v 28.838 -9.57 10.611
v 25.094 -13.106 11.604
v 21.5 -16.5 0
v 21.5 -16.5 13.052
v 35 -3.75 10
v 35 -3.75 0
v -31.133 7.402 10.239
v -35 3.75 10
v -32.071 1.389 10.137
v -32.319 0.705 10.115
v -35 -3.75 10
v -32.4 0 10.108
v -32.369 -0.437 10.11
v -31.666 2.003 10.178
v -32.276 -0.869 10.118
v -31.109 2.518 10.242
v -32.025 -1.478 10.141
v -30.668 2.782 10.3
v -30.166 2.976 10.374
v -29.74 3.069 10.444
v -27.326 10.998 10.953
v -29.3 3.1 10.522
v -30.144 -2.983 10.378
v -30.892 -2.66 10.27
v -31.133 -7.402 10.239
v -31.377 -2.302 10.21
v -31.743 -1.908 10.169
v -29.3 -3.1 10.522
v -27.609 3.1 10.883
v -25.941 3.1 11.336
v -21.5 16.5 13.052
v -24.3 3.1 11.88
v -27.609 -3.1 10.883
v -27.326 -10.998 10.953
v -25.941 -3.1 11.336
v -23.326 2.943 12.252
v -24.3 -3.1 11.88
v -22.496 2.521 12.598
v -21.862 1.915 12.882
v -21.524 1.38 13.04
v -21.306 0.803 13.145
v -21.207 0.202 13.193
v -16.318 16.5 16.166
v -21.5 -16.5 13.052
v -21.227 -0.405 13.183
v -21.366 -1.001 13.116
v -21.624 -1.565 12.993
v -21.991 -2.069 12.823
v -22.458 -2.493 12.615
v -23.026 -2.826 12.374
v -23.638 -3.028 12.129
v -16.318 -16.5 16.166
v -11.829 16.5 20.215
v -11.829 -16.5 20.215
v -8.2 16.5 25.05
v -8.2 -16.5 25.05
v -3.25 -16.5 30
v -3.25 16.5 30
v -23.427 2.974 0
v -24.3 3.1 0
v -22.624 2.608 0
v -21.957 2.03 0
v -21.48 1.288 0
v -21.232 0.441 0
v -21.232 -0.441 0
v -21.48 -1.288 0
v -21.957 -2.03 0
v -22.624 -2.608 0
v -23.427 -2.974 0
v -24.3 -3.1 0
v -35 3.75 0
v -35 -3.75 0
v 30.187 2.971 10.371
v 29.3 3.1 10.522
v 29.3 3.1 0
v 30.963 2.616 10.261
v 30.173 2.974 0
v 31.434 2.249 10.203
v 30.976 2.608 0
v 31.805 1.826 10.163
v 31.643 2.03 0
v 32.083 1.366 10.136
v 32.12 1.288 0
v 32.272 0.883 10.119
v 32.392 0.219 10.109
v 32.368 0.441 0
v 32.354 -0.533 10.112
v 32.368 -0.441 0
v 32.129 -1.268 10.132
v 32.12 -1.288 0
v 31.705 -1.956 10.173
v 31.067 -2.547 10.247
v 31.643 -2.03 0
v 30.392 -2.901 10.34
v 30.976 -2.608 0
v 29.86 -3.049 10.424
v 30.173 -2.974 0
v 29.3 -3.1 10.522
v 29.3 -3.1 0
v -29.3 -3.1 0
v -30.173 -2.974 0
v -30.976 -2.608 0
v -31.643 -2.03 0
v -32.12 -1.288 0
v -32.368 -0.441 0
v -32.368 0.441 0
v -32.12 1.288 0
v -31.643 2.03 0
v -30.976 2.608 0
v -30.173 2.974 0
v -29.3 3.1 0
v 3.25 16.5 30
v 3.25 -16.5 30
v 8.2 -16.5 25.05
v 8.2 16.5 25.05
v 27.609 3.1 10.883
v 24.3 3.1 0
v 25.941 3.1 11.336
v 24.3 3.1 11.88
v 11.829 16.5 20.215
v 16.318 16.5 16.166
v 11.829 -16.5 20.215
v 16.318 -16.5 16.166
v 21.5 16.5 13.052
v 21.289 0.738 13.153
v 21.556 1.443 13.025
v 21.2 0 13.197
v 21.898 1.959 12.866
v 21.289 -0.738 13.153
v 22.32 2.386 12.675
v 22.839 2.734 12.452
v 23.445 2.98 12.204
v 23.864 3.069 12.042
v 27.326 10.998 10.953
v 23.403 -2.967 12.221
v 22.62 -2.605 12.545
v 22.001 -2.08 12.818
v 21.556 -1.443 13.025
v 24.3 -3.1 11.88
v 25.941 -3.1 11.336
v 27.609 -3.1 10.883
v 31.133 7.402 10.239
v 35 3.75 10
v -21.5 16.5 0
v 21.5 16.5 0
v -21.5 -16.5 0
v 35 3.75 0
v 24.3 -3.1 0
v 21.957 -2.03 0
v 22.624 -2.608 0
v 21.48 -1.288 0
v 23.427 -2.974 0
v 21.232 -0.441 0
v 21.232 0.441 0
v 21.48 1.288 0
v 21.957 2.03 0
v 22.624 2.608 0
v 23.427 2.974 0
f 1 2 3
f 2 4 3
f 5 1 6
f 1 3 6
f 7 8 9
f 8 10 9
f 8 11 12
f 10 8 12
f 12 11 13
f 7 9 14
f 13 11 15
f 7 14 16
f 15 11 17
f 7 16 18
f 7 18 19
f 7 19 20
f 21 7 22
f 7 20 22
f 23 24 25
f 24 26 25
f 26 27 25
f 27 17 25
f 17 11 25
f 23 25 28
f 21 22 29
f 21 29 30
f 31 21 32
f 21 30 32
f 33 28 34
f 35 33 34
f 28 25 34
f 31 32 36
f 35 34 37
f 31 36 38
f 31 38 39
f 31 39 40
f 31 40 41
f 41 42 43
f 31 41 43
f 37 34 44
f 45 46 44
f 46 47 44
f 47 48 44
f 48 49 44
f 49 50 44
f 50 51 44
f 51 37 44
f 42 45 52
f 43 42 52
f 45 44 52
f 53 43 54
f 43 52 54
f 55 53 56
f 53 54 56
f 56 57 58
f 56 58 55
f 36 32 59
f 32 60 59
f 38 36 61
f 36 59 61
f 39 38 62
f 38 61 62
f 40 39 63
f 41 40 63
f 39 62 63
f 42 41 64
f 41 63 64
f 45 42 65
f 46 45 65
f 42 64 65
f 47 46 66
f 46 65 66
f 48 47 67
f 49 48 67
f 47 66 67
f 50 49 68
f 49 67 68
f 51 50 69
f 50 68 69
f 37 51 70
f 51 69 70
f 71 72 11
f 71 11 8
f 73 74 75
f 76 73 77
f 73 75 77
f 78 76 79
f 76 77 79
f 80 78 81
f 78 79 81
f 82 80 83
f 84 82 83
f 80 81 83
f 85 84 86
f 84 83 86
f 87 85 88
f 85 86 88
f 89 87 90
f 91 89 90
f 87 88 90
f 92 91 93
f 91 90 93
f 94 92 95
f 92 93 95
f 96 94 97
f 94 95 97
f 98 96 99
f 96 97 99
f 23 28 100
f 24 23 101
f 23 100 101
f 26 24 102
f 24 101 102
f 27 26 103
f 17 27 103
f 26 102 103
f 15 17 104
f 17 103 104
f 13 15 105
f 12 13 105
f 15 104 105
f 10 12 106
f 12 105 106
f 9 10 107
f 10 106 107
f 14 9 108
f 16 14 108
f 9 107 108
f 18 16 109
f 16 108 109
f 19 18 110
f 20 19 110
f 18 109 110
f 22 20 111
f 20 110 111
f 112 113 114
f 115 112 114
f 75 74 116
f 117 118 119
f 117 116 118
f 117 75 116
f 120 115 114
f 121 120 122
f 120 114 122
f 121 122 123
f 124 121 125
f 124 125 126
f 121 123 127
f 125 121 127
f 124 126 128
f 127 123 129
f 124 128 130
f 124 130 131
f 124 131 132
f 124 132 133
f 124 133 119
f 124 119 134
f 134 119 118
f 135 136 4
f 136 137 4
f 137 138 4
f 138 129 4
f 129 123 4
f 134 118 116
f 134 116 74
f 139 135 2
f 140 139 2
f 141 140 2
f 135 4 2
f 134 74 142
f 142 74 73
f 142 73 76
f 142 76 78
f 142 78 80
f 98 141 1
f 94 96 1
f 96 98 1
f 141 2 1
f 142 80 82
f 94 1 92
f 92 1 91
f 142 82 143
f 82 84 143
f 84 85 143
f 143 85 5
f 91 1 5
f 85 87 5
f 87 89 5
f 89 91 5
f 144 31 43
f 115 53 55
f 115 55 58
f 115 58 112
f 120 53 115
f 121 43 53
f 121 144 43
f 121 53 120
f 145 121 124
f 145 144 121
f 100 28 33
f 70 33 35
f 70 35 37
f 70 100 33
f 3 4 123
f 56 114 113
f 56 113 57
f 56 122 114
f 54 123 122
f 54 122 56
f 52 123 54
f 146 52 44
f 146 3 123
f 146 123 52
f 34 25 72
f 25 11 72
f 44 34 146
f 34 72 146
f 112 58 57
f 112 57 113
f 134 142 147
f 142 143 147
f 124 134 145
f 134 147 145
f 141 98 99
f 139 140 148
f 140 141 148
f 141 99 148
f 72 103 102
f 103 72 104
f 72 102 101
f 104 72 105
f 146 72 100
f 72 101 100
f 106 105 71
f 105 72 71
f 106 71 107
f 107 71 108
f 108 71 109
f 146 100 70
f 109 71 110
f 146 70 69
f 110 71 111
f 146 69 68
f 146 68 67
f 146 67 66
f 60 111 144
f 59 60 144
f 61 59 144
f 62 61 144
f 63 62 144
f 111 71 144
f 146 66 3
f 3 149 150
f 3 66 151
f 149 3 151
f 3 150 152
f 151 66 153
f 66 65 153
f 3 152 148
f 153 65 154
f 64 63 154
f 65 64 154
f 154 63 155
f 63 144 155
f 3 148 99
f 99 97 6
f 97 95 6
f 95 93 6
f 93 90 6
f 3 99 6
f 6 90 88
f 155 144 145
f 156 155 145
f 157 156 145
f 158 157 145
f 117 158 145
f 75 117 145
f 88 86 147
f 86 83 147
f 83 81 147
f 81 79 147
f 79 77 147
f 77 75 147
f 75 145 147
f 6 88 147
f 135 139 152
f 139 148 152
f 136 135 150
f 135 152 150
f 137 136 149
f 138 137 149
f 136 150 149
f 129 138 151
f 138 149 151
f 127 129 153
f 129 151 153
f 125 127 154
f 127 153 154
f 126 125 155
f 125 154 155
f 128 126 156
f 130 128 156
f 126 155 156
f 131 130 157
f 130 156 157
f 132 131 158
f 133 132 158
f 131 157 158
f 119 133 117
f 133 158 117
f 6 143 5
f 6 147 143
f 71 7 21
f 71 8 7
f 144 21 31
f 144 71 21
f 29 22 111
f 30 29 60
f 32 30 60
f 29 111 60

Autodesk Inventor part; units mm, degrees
ref_plane "YZ Plane" through (0, 0, 0) normal (1, 0, 0) x (0, 1, 0)
ref_plane "XZ Plane" through (0, 0, 0) normal (0, 1, 0) x (-1, 0, 0)
ref_plane "XY Plane" through (0, 0, 0) normal (0, 0, 1) x (1, 0, 0)
sketch "Sketch1" plane through (0, 0, 0) normal (0, 0, 1) x (1, 0, 0)
  line L0 (35, -3.75) -> (-35, -3.75)
  line L1 (-35, -3.75) -> (-35, 3.75)
  line L2 (-35, 3.75) -> (35, 3.75)
  line L3 (35, 3.75) -> (35, -3.75)
  line L4 (35, -3.75) -> (-35, 3.75) construction
  line L5 (-35, -3.75) -> (35, 3.75) construction
  line L6 (21.5, -16.5) -> (-21.5, -16.5)
  line L7 (-21.5, -16.5) -> (-21.5, 16.5)
  line L8 (-21.5, 16.5) -> (21.5, 16.5)
  line L9 (21.5, 16.5) -> (21.5, -16.5)
  line L10 (21.5, -16.5) -> (-21.5, 16.5) construction
  line L11 (-21.5, -16.5) -> (21.5, 16.5) construction
  line L12 (-35, -3.75) -> (-21.5, -16.5)
  line L13 (-35, 3.75) -> (-21.5, 16.5)
  arc A0 (32.3113, 4.5234) -> (35, 3.75) centre (34.605, 7.4371) ccw
  line L14 (21.5, -16.5) -> (35, -3.75)
  line L15 (35, 3.75) -> (21.5, 16.5)
  point P0 (0, 0)
  dimension "d0" = 70
  dimension "d1" = 7.5
  dimension "d2" = 43
  dimension "d3" = 33
extrude "Extrusion1" add sketch "Sketch1" along normal blind 30
sketch "Sketch2" plane through (-21.5, -16.5, 0) normal (0, -1, 0) x (1, 0, 0)
  line L0 (43, 30) -> (0, 30) projected
  line L1 (43, 0) -> (0, 0) projected
  line L2 (0, 30) -> (43, 30)
  line L3 (43, 30) -> (43, 0)
  line L4 (43, 0) -> (0, 0)
  line L5 (0, 0) -> (0, 30)
  line L6 (21.5, 30) -> (24.75, 30)
  line L7 (56.5, 0) -> (56.5, 30) projected
  line L8 (56.5, 0) -> (56.5, 10)
  line L9 (24.75, 30) -> (29.6997, 25.0503)
  arc A0 (29.6997, 25.0503) -> (56.5, 10) centre (56.5, 41.387) ccw
  arc A1 (55.355, 10.0209) -> (56.5, 10) centre (56.5, 41.387) ccw
  line L10 (56.5, 10) -> (46.9475, 10)
  line L11 (21.5, 30) -> (21.5, 26.75)
  line L12 (21.5, 30) -> (18.25, 30)
  line L13 (-13.5, 0) -> (-13.5, 30)
  line L14 (18.25, 30) -> (13.3003, 25.0503)
  arc A2 (-13.5, 10) -> (13.3003, 25.0503) centre (-13.5, 41.387) ccw
  line L15 (43, 30) -> (56.5, 30) projected
  line L16 (43, 0) -> (43, 30) projected
  line L17 (56.5, 30) -> (43, 30) projected
  line L18 (43, 0) -> (43, 30) projected
  line L19 (56.5, 0) -> (43, 0) projected
  line L20 (56.5, 0) -> (56.5, 30) projected
  line L21 (43, 0) -> (56.5, 0) projected
  line L22 (43, 0) -> (56.5, 0) projected
  line L23 (56.5, 0) -> (56.5, 30) projected
  line L24 (43, 30) -> (56.5, 30) projected
  line L25 (43, 0) -> (43, 30) projected
  line L26 (56.5, 0) -> (56.5, 30) projected
  line L27 (56.5, 0) -> (56.5, 30) projected
  line L28 (56.5, 0) -> (43, 0) projected
  line L29 (43, 0) -> (43, 30) projected
  line L30 (56.5, 30) -> (43, 30) projected
  line L31 (56.5, 0) -> (56.5, 30) projected
  line L32 (43, 0) -> (56.5, 0) projected
  line L33 (0, 0) -> (43, 0) projected
  line L34 (-13.5, 0) -> (0, 0) projected
  line L35 (0, 0) -> (-13.5, 0) projected
  line L36 (43, 0) -> (0, 0) projected
  line L37 (56.5, 0) -> (43, 0) projected
  line L38 (43, 30) -> (56.5, 30) projected
  line L39 (56.5, 30) -> (43, 30) projected
  line L40 (43, 30) -> (0, 30) projected
  line L41 (0, 30) -> (-13.5, 30) projected
  line L42 (-13.5, 30) -> (0, 30) projected
  line L43 (0, 30) -> (43, 30) projected
  line L44 (0, 30) -> (43, 30) projected
  line L45 (0, 0) -> (43, 0) projected
  line L46 (43, 0) -> (0, 0) projected
  line L47 (0, 0) -> (0, 30) projected
  line L48 (43, 30) -> (0, 30) projected
  line L49 (43, 0) -> (43, 30) projected
  line L50 (0, 0) -> (43, 0) projected
  line L51 (43, 0) -> (43, 30) projected
  line L52 (0, 30) -> (43, 30) projected
  line L53 (0, 0) -> (0, 30) projected
  line L54 (0, 0) -> (0, 30) projected
  line L55 (0, 0) -> (0, 30) projected
  line L56 (0, 0) -> (-13.5, 0) projected
  line L57 (-13.5, 0) -> (-13.5, 30) projected
  line L58 (-13.5, 0) -> (-13.5, 30) projected
  line L59 (-13.5, 0) -> (0, 0) projected
  line L60 (0, 0) -> (-13.5, 0) projected
  line L61 (-13.5, 0) -> (-13.5, 30) projected
  line L62 (0, 30) -> (-13.5, 30) projected
  line L63 (0, 0) -> (0, 30) projected
  line L64 (-13.5, 0) -> (-13.5, 30) projected
  line L65 (-13.5, 0) -> (-13.5, 30) projected
  line L66 (-13.5, 0) -> (0, 0) projected
  line L67 (0, 0) -> (0, 30) projected
  line L68 (-13.5, 30) -> (0, 30) projected
  line L69 (-13.5, 0) -> (-13.5, 30) projected
  line L70 (-13.5, 30) -> (0, 30) projected
  line L71 (0, 30) -> (-13.5, 30) projected
  point P0 (21.5, 0)
  dimension "d6" = 3.25
  dimension "d7" = 10
  dimension "d8" = 7
  dimension "d9" = 45
extrude "Extrusion2" cut sketch "Sketch2" against normal blind 36.35 contours L3 A0 L9 L0 | L15 L7 A0 L3 | L14 A2 L5 L0 | L5 A2 L13 L41
sketch "Sketch3" plane through (0, 0, 0) normal (0, 0, -1) x (-1, 0, 0)
  line L0 (35, 3.75) -> (35, -3.75) projected
  circle A0 centre (29.3, 0) radius 3.1
  line L1 (32.4, 0) -> (24.3, 0)
  circle A1 centre (24.3, 0) radius 3.1
  line L2 (29.3, -3.1) -> (24.3, -3.1)
  line L3 (29.3, 3.1) -> (24.3, 3.1)
  line L4 (0, 0) -> (0, -2.435)
  circle A2 centre (-29.3, 0) radius 3.1
  line L5 (-32.4, 0) -> (-24.3, 0)
  circle A3 centre (-24.3, 0) radius 3.1
  line L6 (-29.3, -3.1) -> (-24.3, -3.1)
  line L7 (-29.3, 3.1) -> (-24.3, 3.1)
  dimension "d12" = 5.7
  dimension "d13" = 6.2
  dimension "d14" = 8.1
  dimension "d15" = 6.2
extrude "Extrusion3" cut sketch "Sketch3" against normal blind 36.35
properties part number "scanner"
